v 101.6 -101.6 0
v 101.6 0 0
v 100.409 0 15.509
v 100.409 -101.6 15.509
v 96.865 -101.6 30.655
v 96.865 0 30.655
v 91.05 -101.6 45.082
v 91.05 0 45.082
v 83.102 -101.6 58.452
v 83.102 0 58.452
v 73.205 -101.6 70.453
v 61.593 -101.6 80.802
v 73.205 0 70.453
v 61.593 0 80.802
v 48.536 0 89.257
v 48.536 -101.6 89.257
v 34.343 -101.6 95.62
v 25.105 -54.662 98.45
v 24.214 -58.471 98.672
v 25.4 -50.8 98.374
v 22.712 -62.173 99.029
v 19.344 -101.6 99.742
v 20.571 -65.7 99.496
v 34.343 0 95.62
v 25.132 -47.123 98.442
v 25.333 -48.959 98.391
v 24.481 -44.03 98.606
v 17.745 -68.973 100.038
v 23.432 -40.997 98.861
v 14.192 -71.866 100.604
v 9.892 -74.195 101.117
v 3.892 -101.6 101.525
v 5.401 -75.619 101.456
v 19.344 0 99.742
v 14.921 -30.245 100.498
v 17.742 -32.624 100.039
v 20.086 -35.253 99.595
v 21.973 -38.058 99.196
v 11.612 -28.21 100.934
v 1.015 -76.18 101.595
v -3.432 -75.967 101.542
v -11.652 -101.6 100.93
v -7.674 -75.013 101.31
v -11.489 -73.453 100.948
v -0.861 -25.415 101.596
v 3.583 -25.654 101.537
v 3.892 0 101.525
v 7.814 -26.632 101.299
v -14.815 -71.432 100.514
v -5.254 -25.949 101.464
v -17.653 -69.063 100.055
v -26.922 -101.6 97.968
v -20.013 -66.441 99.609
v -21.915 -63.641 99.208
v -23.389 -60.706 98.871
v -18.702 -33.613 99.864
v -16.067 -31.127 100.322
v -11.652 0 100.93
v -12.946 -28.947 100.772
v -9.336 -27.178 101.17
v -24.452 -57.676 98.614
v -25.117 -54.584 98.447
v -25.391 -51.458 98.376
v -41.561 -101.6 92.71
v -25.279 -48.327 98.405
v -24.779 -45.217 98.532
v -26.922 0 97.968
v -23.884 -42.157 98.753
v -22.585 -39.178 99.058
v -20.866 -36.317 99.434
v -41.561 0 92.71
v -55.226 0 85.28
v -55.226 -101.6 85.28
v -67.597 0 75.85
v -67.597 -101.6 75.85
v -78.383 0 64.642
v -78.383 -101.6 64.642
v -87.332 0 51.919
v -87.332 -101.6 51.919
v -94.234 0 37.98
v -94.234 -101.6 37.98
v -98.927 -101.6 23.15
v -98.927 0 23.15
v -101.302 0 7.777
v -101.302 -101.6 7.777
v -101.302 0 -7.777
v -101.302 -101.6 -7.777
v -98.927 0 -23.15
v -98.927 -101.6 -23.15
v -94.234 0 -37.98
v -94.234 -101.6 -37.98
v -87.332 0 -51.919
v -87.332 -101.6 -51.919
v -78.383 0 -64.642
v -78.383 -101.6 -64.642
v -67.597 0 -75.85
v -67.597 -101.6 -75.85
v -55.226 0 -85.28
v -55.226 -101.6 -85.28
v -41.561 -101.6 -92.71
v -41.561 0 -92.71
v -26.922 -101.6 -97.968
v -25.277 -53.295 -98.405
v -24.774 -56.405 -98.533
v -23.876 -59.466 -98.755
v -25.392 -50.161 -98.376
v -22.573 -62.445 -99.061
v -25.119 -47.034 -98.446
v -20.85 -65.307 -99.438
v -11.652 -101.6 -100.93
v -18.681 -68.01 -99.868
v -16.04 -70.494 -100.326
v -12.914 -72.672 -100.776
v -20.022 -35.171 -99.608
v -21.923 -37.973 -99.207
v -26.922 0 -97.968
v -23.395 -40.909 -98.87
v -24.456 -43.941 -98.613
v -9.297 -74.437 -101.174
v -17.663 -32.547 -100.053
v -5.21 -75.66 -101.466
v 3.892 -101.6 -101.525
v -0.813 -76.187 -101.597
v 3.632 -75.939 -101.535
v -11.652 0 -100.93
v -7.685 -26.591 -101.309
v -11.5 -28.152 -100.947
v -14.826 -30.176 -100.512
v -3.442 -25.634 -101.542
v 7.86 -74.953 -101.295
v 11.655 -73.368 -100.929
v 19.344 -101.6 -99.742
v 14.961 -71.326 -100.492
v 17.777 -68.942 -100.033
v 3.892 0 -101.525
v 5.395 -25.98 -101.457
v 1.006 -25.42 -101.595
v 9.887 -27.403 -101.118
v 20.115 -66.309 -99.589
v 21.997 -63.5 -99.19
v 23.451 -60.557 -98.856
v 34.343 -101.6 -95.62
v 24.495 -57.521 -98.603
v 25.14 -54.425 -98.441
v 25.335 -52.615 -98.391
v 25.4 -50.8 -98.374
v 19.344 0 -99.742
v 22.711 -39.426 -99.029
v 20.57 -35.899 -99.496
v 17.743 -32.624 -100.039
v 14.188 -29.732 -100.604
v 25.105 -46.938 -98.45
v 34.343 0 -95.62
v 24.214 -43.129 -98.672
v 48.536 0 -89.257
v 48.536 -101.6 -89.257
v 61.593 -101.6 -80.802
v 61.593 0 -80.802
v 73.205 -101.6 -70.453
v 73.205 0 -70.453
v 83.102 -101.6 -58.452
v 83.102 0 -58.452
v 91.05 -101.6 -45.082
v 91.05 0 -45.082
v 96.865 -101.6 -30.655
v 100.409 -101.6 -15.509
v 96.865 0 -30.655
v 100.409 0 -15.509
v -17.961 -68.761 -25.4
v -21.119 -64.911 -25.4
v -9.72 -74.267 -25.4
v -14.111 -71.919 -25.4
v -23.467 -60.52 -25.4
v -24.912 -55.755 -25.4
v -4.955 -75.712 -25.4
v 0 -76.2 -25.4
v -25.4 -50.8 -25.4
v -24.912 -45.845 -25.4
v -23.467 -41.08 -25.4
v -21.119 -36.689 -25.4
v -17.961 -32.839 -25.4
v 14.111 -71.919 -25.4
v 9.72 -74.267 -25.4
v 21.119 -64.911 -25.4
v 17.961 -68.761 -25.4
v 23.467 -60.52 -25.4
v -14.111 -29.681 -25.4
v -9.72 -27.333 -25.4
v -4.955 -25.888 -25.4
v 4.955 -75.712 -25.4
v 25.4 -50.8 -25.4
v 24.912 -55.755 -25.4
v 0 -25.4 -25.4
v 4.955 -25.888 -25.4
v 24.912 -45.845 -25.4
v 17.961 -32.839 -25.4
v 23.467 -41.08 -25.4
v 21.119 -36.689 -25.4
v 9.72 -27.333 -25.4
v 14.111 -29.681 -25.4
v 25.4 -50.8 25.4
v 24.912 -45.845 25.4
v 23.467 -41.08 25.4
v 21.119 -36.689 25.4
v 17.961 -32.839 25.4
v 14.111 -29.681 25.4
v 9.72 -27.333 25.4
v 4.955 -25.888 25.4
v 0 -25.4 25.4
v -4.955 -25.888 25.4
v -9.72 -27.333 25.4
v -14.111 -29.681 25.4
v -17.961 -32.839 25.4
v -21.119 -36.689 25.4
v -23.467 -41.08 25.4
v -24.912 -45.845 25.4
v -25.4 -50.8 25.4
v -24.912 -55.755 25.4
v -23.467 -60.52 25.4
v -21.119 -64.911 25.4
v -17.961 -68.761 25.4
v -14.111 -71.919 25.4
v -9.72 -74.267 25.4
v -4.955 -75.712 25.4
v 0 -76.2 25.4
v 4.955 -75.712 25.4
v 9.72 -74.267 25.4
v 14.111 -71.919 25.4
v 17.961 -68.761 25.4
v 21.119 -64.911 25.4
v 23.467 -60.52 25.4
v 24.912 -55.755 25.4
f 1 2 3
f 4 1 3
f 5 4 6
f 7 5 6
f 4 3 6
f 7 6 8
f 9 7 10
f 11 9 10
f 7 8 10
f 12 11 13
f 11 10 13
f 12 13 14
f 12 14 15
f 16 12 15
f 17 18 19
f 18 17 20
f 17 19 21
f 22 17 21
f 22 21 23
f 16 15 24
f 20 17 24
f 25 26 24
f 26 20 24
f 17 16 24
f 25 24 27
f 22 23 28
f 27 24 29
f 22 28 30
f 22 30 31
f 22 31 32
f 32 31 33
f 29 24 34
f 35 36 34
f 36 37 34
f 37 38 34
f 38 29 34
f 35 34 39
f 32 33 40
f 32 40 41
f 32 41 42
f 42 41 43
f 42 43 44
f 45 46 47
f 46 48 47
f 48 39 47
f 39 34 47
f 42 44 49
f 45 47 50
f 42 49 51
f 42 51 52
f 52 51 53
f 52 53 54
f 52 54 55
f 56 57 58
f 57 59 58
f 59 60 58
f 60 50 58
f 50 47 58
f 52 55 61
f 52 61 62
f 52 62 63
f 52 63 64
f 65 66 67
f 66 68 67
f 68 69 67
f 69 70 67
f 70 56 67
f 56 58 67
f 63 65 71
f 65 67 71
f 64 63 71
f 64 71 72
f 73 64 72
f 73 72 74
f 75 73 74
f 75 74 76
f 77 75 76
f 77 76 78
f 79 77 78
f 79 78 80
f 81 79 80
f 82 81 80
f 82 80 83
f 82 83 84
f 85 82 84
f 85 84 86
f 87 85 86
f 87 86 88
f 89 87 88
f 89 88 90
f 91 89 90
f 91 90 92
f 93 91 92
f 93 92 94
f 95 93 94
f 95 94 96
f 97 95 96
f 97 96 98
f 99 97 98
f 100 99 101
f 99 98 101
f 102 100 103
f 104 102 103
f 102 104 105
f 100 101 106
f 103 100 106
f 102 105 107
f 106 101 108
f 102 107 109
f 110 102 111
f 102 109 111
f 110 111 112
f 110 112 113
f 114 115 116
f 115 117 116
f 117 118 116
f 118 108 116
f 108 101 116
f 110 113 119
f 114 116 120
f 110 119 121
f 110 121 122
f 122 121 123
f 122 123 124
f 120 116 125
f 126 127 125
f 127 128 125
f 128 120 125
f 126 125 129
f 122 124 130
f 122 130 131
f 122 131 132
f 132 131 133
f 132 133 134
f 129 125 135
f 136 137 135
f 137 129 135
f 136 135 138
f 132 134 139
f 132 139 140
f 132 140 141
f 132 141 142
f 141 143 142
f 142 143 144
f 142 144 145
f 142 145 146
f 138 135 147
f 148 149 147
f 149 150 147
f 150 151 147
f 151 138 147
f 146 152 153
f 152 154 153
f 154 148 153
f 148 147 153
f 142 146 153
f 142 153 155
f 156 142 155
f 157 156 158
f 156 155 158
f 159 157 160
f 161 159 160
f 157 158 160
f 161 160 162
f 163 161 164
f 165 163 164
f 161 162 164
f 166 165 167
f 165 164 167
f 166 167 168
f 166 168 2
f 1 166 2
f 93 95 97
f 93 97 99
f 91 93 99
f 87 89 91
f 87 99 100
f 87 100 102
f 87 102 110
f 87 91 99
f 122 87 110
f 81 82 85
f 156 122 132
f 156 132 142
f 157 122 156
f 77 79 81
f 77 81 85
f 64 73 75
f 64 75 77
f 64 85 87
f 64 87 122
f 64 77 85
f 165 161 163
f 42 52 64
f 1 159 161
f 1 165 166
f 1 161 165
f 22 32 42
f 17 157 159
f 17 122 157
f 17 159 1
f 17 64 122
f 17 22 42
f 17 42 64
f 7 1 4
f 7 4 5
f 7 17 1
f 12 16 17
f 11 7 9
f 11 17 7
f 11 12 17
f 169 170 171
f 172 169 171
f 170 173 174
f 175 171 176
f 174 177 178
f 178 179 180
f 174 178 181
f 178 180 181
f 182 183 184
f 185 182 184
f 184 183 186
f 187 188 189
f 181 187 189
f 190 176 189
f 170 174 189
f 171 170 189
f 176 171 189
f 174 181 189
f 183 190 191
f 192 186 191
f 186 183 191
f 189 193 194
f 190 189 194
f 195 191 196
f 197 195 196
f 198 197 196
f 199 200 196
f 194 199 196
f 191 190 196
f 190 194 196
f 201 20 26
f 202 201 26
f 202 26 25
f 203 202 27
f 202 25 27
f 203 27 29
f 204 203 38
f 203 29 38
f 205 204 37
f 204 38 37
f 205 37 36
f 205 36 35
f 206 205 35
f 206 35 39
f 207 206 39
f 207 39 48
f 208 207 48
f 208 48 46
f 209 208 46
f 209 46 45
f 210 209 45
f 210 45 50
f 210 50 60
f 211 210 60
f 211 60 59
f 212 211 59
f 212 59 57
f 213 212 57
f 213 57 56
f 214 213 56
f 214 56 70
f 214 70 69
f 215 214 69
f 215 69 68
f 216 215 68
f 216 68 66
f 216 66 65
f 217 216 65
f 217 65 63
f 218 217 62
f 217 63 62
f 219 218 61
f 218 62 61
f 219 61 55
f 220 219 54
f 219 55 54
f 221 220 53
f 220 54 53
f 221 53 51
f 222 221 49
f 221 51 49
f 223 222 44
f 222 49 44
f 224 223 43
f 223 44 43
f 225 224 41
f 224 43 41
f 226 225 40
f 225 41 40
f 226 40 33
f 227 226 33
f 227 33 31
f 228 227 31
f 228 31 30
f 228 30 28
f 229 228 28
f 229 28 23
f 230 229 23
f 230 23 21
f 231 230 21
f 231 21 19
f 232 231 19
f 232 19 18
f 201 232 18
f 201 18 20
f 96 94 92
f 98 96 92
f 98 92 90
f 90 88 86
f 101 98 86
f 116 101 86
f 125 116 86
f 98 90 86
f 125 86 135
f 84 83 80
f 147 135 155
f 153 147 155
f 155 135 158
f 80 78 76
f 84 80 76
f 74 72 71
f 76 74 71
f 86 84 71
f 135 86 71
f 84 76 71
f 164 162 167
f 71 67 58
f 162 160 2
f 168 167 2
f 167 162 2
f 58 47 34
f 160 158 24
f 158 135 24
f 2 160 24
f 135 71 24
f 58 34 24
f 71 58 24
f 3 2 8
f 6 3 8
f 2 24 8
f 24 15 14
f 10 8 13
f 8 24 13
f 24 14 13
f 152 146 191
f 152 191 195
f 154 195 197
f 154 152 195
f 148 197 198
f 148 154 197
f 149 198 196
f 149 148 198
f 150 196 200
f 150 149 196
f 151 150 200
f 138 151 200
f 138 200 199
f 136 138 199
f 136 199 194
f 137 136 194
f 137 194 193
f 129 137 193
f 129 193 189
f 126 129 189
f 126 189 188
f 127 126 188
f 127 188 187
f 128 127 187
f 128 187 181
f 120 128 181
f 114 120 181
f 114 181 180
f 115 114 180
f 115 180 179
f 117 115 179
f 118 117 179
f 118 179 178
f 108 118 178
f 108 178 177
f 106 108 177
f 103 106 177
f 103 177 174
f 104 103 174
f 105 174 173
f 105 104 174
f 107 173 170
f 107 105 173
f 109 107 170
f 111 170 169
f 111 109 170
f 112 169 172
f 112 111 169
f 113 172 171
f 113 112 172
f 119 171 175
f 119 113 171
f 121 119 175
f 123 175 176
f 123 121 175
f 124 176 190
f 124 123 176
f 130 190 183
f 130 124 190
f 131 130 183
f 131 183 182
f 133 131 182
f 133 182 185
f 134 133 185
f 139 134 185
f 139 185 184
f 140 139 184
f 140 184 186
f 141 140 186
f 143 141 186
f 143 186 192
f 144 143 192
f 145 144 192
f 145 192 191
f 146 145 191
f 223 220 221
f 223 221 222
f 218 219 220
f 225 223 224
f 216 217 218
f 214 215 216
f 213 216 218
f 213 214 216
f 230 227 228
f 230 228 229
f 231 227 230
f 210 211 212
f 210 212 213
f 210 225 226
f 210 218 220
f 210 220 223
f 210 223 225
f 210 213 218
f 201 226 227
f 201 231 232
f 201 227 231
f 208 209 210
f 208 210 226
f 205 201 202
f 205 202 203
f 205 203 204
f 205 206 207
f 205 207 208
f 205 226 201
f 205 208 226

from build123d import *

# Parameters (mm, degrees)
F0_R     = 101.6
F1_DEPTH = 101.6
F3_R     = 25.4
F4_DEPTH = 76.2
F6_R     = 25.4
F7_DEPTH = 76.2


with BuildPart() as f1:
    # F0 (on Front) → F1 (new body)
    with BuildSketch(Plane.XZ):
        Circle(F0_R)
    extrude(amount=F1_DEPTH)

    # F3 (on offset) → F4 (cut)
    with BuildSketch(Plane.XY.offset(101.6)):
        with Locations((0, -50.8)):
            Circle(F3_R)
    extrude(amount=-F4_DEPTH, mode=Mode.SUBTRACT)

    # F6 (on offset) → F7 (cut)
    with BuildSketch(Plane.XY.offset(-101.6)):
        with Locations((0, -50.8)):
            Circle(F6_R)
    extrude(amount=F7_DEPTH, mode=Mode.SUBTRACT)


solid = f1.part
